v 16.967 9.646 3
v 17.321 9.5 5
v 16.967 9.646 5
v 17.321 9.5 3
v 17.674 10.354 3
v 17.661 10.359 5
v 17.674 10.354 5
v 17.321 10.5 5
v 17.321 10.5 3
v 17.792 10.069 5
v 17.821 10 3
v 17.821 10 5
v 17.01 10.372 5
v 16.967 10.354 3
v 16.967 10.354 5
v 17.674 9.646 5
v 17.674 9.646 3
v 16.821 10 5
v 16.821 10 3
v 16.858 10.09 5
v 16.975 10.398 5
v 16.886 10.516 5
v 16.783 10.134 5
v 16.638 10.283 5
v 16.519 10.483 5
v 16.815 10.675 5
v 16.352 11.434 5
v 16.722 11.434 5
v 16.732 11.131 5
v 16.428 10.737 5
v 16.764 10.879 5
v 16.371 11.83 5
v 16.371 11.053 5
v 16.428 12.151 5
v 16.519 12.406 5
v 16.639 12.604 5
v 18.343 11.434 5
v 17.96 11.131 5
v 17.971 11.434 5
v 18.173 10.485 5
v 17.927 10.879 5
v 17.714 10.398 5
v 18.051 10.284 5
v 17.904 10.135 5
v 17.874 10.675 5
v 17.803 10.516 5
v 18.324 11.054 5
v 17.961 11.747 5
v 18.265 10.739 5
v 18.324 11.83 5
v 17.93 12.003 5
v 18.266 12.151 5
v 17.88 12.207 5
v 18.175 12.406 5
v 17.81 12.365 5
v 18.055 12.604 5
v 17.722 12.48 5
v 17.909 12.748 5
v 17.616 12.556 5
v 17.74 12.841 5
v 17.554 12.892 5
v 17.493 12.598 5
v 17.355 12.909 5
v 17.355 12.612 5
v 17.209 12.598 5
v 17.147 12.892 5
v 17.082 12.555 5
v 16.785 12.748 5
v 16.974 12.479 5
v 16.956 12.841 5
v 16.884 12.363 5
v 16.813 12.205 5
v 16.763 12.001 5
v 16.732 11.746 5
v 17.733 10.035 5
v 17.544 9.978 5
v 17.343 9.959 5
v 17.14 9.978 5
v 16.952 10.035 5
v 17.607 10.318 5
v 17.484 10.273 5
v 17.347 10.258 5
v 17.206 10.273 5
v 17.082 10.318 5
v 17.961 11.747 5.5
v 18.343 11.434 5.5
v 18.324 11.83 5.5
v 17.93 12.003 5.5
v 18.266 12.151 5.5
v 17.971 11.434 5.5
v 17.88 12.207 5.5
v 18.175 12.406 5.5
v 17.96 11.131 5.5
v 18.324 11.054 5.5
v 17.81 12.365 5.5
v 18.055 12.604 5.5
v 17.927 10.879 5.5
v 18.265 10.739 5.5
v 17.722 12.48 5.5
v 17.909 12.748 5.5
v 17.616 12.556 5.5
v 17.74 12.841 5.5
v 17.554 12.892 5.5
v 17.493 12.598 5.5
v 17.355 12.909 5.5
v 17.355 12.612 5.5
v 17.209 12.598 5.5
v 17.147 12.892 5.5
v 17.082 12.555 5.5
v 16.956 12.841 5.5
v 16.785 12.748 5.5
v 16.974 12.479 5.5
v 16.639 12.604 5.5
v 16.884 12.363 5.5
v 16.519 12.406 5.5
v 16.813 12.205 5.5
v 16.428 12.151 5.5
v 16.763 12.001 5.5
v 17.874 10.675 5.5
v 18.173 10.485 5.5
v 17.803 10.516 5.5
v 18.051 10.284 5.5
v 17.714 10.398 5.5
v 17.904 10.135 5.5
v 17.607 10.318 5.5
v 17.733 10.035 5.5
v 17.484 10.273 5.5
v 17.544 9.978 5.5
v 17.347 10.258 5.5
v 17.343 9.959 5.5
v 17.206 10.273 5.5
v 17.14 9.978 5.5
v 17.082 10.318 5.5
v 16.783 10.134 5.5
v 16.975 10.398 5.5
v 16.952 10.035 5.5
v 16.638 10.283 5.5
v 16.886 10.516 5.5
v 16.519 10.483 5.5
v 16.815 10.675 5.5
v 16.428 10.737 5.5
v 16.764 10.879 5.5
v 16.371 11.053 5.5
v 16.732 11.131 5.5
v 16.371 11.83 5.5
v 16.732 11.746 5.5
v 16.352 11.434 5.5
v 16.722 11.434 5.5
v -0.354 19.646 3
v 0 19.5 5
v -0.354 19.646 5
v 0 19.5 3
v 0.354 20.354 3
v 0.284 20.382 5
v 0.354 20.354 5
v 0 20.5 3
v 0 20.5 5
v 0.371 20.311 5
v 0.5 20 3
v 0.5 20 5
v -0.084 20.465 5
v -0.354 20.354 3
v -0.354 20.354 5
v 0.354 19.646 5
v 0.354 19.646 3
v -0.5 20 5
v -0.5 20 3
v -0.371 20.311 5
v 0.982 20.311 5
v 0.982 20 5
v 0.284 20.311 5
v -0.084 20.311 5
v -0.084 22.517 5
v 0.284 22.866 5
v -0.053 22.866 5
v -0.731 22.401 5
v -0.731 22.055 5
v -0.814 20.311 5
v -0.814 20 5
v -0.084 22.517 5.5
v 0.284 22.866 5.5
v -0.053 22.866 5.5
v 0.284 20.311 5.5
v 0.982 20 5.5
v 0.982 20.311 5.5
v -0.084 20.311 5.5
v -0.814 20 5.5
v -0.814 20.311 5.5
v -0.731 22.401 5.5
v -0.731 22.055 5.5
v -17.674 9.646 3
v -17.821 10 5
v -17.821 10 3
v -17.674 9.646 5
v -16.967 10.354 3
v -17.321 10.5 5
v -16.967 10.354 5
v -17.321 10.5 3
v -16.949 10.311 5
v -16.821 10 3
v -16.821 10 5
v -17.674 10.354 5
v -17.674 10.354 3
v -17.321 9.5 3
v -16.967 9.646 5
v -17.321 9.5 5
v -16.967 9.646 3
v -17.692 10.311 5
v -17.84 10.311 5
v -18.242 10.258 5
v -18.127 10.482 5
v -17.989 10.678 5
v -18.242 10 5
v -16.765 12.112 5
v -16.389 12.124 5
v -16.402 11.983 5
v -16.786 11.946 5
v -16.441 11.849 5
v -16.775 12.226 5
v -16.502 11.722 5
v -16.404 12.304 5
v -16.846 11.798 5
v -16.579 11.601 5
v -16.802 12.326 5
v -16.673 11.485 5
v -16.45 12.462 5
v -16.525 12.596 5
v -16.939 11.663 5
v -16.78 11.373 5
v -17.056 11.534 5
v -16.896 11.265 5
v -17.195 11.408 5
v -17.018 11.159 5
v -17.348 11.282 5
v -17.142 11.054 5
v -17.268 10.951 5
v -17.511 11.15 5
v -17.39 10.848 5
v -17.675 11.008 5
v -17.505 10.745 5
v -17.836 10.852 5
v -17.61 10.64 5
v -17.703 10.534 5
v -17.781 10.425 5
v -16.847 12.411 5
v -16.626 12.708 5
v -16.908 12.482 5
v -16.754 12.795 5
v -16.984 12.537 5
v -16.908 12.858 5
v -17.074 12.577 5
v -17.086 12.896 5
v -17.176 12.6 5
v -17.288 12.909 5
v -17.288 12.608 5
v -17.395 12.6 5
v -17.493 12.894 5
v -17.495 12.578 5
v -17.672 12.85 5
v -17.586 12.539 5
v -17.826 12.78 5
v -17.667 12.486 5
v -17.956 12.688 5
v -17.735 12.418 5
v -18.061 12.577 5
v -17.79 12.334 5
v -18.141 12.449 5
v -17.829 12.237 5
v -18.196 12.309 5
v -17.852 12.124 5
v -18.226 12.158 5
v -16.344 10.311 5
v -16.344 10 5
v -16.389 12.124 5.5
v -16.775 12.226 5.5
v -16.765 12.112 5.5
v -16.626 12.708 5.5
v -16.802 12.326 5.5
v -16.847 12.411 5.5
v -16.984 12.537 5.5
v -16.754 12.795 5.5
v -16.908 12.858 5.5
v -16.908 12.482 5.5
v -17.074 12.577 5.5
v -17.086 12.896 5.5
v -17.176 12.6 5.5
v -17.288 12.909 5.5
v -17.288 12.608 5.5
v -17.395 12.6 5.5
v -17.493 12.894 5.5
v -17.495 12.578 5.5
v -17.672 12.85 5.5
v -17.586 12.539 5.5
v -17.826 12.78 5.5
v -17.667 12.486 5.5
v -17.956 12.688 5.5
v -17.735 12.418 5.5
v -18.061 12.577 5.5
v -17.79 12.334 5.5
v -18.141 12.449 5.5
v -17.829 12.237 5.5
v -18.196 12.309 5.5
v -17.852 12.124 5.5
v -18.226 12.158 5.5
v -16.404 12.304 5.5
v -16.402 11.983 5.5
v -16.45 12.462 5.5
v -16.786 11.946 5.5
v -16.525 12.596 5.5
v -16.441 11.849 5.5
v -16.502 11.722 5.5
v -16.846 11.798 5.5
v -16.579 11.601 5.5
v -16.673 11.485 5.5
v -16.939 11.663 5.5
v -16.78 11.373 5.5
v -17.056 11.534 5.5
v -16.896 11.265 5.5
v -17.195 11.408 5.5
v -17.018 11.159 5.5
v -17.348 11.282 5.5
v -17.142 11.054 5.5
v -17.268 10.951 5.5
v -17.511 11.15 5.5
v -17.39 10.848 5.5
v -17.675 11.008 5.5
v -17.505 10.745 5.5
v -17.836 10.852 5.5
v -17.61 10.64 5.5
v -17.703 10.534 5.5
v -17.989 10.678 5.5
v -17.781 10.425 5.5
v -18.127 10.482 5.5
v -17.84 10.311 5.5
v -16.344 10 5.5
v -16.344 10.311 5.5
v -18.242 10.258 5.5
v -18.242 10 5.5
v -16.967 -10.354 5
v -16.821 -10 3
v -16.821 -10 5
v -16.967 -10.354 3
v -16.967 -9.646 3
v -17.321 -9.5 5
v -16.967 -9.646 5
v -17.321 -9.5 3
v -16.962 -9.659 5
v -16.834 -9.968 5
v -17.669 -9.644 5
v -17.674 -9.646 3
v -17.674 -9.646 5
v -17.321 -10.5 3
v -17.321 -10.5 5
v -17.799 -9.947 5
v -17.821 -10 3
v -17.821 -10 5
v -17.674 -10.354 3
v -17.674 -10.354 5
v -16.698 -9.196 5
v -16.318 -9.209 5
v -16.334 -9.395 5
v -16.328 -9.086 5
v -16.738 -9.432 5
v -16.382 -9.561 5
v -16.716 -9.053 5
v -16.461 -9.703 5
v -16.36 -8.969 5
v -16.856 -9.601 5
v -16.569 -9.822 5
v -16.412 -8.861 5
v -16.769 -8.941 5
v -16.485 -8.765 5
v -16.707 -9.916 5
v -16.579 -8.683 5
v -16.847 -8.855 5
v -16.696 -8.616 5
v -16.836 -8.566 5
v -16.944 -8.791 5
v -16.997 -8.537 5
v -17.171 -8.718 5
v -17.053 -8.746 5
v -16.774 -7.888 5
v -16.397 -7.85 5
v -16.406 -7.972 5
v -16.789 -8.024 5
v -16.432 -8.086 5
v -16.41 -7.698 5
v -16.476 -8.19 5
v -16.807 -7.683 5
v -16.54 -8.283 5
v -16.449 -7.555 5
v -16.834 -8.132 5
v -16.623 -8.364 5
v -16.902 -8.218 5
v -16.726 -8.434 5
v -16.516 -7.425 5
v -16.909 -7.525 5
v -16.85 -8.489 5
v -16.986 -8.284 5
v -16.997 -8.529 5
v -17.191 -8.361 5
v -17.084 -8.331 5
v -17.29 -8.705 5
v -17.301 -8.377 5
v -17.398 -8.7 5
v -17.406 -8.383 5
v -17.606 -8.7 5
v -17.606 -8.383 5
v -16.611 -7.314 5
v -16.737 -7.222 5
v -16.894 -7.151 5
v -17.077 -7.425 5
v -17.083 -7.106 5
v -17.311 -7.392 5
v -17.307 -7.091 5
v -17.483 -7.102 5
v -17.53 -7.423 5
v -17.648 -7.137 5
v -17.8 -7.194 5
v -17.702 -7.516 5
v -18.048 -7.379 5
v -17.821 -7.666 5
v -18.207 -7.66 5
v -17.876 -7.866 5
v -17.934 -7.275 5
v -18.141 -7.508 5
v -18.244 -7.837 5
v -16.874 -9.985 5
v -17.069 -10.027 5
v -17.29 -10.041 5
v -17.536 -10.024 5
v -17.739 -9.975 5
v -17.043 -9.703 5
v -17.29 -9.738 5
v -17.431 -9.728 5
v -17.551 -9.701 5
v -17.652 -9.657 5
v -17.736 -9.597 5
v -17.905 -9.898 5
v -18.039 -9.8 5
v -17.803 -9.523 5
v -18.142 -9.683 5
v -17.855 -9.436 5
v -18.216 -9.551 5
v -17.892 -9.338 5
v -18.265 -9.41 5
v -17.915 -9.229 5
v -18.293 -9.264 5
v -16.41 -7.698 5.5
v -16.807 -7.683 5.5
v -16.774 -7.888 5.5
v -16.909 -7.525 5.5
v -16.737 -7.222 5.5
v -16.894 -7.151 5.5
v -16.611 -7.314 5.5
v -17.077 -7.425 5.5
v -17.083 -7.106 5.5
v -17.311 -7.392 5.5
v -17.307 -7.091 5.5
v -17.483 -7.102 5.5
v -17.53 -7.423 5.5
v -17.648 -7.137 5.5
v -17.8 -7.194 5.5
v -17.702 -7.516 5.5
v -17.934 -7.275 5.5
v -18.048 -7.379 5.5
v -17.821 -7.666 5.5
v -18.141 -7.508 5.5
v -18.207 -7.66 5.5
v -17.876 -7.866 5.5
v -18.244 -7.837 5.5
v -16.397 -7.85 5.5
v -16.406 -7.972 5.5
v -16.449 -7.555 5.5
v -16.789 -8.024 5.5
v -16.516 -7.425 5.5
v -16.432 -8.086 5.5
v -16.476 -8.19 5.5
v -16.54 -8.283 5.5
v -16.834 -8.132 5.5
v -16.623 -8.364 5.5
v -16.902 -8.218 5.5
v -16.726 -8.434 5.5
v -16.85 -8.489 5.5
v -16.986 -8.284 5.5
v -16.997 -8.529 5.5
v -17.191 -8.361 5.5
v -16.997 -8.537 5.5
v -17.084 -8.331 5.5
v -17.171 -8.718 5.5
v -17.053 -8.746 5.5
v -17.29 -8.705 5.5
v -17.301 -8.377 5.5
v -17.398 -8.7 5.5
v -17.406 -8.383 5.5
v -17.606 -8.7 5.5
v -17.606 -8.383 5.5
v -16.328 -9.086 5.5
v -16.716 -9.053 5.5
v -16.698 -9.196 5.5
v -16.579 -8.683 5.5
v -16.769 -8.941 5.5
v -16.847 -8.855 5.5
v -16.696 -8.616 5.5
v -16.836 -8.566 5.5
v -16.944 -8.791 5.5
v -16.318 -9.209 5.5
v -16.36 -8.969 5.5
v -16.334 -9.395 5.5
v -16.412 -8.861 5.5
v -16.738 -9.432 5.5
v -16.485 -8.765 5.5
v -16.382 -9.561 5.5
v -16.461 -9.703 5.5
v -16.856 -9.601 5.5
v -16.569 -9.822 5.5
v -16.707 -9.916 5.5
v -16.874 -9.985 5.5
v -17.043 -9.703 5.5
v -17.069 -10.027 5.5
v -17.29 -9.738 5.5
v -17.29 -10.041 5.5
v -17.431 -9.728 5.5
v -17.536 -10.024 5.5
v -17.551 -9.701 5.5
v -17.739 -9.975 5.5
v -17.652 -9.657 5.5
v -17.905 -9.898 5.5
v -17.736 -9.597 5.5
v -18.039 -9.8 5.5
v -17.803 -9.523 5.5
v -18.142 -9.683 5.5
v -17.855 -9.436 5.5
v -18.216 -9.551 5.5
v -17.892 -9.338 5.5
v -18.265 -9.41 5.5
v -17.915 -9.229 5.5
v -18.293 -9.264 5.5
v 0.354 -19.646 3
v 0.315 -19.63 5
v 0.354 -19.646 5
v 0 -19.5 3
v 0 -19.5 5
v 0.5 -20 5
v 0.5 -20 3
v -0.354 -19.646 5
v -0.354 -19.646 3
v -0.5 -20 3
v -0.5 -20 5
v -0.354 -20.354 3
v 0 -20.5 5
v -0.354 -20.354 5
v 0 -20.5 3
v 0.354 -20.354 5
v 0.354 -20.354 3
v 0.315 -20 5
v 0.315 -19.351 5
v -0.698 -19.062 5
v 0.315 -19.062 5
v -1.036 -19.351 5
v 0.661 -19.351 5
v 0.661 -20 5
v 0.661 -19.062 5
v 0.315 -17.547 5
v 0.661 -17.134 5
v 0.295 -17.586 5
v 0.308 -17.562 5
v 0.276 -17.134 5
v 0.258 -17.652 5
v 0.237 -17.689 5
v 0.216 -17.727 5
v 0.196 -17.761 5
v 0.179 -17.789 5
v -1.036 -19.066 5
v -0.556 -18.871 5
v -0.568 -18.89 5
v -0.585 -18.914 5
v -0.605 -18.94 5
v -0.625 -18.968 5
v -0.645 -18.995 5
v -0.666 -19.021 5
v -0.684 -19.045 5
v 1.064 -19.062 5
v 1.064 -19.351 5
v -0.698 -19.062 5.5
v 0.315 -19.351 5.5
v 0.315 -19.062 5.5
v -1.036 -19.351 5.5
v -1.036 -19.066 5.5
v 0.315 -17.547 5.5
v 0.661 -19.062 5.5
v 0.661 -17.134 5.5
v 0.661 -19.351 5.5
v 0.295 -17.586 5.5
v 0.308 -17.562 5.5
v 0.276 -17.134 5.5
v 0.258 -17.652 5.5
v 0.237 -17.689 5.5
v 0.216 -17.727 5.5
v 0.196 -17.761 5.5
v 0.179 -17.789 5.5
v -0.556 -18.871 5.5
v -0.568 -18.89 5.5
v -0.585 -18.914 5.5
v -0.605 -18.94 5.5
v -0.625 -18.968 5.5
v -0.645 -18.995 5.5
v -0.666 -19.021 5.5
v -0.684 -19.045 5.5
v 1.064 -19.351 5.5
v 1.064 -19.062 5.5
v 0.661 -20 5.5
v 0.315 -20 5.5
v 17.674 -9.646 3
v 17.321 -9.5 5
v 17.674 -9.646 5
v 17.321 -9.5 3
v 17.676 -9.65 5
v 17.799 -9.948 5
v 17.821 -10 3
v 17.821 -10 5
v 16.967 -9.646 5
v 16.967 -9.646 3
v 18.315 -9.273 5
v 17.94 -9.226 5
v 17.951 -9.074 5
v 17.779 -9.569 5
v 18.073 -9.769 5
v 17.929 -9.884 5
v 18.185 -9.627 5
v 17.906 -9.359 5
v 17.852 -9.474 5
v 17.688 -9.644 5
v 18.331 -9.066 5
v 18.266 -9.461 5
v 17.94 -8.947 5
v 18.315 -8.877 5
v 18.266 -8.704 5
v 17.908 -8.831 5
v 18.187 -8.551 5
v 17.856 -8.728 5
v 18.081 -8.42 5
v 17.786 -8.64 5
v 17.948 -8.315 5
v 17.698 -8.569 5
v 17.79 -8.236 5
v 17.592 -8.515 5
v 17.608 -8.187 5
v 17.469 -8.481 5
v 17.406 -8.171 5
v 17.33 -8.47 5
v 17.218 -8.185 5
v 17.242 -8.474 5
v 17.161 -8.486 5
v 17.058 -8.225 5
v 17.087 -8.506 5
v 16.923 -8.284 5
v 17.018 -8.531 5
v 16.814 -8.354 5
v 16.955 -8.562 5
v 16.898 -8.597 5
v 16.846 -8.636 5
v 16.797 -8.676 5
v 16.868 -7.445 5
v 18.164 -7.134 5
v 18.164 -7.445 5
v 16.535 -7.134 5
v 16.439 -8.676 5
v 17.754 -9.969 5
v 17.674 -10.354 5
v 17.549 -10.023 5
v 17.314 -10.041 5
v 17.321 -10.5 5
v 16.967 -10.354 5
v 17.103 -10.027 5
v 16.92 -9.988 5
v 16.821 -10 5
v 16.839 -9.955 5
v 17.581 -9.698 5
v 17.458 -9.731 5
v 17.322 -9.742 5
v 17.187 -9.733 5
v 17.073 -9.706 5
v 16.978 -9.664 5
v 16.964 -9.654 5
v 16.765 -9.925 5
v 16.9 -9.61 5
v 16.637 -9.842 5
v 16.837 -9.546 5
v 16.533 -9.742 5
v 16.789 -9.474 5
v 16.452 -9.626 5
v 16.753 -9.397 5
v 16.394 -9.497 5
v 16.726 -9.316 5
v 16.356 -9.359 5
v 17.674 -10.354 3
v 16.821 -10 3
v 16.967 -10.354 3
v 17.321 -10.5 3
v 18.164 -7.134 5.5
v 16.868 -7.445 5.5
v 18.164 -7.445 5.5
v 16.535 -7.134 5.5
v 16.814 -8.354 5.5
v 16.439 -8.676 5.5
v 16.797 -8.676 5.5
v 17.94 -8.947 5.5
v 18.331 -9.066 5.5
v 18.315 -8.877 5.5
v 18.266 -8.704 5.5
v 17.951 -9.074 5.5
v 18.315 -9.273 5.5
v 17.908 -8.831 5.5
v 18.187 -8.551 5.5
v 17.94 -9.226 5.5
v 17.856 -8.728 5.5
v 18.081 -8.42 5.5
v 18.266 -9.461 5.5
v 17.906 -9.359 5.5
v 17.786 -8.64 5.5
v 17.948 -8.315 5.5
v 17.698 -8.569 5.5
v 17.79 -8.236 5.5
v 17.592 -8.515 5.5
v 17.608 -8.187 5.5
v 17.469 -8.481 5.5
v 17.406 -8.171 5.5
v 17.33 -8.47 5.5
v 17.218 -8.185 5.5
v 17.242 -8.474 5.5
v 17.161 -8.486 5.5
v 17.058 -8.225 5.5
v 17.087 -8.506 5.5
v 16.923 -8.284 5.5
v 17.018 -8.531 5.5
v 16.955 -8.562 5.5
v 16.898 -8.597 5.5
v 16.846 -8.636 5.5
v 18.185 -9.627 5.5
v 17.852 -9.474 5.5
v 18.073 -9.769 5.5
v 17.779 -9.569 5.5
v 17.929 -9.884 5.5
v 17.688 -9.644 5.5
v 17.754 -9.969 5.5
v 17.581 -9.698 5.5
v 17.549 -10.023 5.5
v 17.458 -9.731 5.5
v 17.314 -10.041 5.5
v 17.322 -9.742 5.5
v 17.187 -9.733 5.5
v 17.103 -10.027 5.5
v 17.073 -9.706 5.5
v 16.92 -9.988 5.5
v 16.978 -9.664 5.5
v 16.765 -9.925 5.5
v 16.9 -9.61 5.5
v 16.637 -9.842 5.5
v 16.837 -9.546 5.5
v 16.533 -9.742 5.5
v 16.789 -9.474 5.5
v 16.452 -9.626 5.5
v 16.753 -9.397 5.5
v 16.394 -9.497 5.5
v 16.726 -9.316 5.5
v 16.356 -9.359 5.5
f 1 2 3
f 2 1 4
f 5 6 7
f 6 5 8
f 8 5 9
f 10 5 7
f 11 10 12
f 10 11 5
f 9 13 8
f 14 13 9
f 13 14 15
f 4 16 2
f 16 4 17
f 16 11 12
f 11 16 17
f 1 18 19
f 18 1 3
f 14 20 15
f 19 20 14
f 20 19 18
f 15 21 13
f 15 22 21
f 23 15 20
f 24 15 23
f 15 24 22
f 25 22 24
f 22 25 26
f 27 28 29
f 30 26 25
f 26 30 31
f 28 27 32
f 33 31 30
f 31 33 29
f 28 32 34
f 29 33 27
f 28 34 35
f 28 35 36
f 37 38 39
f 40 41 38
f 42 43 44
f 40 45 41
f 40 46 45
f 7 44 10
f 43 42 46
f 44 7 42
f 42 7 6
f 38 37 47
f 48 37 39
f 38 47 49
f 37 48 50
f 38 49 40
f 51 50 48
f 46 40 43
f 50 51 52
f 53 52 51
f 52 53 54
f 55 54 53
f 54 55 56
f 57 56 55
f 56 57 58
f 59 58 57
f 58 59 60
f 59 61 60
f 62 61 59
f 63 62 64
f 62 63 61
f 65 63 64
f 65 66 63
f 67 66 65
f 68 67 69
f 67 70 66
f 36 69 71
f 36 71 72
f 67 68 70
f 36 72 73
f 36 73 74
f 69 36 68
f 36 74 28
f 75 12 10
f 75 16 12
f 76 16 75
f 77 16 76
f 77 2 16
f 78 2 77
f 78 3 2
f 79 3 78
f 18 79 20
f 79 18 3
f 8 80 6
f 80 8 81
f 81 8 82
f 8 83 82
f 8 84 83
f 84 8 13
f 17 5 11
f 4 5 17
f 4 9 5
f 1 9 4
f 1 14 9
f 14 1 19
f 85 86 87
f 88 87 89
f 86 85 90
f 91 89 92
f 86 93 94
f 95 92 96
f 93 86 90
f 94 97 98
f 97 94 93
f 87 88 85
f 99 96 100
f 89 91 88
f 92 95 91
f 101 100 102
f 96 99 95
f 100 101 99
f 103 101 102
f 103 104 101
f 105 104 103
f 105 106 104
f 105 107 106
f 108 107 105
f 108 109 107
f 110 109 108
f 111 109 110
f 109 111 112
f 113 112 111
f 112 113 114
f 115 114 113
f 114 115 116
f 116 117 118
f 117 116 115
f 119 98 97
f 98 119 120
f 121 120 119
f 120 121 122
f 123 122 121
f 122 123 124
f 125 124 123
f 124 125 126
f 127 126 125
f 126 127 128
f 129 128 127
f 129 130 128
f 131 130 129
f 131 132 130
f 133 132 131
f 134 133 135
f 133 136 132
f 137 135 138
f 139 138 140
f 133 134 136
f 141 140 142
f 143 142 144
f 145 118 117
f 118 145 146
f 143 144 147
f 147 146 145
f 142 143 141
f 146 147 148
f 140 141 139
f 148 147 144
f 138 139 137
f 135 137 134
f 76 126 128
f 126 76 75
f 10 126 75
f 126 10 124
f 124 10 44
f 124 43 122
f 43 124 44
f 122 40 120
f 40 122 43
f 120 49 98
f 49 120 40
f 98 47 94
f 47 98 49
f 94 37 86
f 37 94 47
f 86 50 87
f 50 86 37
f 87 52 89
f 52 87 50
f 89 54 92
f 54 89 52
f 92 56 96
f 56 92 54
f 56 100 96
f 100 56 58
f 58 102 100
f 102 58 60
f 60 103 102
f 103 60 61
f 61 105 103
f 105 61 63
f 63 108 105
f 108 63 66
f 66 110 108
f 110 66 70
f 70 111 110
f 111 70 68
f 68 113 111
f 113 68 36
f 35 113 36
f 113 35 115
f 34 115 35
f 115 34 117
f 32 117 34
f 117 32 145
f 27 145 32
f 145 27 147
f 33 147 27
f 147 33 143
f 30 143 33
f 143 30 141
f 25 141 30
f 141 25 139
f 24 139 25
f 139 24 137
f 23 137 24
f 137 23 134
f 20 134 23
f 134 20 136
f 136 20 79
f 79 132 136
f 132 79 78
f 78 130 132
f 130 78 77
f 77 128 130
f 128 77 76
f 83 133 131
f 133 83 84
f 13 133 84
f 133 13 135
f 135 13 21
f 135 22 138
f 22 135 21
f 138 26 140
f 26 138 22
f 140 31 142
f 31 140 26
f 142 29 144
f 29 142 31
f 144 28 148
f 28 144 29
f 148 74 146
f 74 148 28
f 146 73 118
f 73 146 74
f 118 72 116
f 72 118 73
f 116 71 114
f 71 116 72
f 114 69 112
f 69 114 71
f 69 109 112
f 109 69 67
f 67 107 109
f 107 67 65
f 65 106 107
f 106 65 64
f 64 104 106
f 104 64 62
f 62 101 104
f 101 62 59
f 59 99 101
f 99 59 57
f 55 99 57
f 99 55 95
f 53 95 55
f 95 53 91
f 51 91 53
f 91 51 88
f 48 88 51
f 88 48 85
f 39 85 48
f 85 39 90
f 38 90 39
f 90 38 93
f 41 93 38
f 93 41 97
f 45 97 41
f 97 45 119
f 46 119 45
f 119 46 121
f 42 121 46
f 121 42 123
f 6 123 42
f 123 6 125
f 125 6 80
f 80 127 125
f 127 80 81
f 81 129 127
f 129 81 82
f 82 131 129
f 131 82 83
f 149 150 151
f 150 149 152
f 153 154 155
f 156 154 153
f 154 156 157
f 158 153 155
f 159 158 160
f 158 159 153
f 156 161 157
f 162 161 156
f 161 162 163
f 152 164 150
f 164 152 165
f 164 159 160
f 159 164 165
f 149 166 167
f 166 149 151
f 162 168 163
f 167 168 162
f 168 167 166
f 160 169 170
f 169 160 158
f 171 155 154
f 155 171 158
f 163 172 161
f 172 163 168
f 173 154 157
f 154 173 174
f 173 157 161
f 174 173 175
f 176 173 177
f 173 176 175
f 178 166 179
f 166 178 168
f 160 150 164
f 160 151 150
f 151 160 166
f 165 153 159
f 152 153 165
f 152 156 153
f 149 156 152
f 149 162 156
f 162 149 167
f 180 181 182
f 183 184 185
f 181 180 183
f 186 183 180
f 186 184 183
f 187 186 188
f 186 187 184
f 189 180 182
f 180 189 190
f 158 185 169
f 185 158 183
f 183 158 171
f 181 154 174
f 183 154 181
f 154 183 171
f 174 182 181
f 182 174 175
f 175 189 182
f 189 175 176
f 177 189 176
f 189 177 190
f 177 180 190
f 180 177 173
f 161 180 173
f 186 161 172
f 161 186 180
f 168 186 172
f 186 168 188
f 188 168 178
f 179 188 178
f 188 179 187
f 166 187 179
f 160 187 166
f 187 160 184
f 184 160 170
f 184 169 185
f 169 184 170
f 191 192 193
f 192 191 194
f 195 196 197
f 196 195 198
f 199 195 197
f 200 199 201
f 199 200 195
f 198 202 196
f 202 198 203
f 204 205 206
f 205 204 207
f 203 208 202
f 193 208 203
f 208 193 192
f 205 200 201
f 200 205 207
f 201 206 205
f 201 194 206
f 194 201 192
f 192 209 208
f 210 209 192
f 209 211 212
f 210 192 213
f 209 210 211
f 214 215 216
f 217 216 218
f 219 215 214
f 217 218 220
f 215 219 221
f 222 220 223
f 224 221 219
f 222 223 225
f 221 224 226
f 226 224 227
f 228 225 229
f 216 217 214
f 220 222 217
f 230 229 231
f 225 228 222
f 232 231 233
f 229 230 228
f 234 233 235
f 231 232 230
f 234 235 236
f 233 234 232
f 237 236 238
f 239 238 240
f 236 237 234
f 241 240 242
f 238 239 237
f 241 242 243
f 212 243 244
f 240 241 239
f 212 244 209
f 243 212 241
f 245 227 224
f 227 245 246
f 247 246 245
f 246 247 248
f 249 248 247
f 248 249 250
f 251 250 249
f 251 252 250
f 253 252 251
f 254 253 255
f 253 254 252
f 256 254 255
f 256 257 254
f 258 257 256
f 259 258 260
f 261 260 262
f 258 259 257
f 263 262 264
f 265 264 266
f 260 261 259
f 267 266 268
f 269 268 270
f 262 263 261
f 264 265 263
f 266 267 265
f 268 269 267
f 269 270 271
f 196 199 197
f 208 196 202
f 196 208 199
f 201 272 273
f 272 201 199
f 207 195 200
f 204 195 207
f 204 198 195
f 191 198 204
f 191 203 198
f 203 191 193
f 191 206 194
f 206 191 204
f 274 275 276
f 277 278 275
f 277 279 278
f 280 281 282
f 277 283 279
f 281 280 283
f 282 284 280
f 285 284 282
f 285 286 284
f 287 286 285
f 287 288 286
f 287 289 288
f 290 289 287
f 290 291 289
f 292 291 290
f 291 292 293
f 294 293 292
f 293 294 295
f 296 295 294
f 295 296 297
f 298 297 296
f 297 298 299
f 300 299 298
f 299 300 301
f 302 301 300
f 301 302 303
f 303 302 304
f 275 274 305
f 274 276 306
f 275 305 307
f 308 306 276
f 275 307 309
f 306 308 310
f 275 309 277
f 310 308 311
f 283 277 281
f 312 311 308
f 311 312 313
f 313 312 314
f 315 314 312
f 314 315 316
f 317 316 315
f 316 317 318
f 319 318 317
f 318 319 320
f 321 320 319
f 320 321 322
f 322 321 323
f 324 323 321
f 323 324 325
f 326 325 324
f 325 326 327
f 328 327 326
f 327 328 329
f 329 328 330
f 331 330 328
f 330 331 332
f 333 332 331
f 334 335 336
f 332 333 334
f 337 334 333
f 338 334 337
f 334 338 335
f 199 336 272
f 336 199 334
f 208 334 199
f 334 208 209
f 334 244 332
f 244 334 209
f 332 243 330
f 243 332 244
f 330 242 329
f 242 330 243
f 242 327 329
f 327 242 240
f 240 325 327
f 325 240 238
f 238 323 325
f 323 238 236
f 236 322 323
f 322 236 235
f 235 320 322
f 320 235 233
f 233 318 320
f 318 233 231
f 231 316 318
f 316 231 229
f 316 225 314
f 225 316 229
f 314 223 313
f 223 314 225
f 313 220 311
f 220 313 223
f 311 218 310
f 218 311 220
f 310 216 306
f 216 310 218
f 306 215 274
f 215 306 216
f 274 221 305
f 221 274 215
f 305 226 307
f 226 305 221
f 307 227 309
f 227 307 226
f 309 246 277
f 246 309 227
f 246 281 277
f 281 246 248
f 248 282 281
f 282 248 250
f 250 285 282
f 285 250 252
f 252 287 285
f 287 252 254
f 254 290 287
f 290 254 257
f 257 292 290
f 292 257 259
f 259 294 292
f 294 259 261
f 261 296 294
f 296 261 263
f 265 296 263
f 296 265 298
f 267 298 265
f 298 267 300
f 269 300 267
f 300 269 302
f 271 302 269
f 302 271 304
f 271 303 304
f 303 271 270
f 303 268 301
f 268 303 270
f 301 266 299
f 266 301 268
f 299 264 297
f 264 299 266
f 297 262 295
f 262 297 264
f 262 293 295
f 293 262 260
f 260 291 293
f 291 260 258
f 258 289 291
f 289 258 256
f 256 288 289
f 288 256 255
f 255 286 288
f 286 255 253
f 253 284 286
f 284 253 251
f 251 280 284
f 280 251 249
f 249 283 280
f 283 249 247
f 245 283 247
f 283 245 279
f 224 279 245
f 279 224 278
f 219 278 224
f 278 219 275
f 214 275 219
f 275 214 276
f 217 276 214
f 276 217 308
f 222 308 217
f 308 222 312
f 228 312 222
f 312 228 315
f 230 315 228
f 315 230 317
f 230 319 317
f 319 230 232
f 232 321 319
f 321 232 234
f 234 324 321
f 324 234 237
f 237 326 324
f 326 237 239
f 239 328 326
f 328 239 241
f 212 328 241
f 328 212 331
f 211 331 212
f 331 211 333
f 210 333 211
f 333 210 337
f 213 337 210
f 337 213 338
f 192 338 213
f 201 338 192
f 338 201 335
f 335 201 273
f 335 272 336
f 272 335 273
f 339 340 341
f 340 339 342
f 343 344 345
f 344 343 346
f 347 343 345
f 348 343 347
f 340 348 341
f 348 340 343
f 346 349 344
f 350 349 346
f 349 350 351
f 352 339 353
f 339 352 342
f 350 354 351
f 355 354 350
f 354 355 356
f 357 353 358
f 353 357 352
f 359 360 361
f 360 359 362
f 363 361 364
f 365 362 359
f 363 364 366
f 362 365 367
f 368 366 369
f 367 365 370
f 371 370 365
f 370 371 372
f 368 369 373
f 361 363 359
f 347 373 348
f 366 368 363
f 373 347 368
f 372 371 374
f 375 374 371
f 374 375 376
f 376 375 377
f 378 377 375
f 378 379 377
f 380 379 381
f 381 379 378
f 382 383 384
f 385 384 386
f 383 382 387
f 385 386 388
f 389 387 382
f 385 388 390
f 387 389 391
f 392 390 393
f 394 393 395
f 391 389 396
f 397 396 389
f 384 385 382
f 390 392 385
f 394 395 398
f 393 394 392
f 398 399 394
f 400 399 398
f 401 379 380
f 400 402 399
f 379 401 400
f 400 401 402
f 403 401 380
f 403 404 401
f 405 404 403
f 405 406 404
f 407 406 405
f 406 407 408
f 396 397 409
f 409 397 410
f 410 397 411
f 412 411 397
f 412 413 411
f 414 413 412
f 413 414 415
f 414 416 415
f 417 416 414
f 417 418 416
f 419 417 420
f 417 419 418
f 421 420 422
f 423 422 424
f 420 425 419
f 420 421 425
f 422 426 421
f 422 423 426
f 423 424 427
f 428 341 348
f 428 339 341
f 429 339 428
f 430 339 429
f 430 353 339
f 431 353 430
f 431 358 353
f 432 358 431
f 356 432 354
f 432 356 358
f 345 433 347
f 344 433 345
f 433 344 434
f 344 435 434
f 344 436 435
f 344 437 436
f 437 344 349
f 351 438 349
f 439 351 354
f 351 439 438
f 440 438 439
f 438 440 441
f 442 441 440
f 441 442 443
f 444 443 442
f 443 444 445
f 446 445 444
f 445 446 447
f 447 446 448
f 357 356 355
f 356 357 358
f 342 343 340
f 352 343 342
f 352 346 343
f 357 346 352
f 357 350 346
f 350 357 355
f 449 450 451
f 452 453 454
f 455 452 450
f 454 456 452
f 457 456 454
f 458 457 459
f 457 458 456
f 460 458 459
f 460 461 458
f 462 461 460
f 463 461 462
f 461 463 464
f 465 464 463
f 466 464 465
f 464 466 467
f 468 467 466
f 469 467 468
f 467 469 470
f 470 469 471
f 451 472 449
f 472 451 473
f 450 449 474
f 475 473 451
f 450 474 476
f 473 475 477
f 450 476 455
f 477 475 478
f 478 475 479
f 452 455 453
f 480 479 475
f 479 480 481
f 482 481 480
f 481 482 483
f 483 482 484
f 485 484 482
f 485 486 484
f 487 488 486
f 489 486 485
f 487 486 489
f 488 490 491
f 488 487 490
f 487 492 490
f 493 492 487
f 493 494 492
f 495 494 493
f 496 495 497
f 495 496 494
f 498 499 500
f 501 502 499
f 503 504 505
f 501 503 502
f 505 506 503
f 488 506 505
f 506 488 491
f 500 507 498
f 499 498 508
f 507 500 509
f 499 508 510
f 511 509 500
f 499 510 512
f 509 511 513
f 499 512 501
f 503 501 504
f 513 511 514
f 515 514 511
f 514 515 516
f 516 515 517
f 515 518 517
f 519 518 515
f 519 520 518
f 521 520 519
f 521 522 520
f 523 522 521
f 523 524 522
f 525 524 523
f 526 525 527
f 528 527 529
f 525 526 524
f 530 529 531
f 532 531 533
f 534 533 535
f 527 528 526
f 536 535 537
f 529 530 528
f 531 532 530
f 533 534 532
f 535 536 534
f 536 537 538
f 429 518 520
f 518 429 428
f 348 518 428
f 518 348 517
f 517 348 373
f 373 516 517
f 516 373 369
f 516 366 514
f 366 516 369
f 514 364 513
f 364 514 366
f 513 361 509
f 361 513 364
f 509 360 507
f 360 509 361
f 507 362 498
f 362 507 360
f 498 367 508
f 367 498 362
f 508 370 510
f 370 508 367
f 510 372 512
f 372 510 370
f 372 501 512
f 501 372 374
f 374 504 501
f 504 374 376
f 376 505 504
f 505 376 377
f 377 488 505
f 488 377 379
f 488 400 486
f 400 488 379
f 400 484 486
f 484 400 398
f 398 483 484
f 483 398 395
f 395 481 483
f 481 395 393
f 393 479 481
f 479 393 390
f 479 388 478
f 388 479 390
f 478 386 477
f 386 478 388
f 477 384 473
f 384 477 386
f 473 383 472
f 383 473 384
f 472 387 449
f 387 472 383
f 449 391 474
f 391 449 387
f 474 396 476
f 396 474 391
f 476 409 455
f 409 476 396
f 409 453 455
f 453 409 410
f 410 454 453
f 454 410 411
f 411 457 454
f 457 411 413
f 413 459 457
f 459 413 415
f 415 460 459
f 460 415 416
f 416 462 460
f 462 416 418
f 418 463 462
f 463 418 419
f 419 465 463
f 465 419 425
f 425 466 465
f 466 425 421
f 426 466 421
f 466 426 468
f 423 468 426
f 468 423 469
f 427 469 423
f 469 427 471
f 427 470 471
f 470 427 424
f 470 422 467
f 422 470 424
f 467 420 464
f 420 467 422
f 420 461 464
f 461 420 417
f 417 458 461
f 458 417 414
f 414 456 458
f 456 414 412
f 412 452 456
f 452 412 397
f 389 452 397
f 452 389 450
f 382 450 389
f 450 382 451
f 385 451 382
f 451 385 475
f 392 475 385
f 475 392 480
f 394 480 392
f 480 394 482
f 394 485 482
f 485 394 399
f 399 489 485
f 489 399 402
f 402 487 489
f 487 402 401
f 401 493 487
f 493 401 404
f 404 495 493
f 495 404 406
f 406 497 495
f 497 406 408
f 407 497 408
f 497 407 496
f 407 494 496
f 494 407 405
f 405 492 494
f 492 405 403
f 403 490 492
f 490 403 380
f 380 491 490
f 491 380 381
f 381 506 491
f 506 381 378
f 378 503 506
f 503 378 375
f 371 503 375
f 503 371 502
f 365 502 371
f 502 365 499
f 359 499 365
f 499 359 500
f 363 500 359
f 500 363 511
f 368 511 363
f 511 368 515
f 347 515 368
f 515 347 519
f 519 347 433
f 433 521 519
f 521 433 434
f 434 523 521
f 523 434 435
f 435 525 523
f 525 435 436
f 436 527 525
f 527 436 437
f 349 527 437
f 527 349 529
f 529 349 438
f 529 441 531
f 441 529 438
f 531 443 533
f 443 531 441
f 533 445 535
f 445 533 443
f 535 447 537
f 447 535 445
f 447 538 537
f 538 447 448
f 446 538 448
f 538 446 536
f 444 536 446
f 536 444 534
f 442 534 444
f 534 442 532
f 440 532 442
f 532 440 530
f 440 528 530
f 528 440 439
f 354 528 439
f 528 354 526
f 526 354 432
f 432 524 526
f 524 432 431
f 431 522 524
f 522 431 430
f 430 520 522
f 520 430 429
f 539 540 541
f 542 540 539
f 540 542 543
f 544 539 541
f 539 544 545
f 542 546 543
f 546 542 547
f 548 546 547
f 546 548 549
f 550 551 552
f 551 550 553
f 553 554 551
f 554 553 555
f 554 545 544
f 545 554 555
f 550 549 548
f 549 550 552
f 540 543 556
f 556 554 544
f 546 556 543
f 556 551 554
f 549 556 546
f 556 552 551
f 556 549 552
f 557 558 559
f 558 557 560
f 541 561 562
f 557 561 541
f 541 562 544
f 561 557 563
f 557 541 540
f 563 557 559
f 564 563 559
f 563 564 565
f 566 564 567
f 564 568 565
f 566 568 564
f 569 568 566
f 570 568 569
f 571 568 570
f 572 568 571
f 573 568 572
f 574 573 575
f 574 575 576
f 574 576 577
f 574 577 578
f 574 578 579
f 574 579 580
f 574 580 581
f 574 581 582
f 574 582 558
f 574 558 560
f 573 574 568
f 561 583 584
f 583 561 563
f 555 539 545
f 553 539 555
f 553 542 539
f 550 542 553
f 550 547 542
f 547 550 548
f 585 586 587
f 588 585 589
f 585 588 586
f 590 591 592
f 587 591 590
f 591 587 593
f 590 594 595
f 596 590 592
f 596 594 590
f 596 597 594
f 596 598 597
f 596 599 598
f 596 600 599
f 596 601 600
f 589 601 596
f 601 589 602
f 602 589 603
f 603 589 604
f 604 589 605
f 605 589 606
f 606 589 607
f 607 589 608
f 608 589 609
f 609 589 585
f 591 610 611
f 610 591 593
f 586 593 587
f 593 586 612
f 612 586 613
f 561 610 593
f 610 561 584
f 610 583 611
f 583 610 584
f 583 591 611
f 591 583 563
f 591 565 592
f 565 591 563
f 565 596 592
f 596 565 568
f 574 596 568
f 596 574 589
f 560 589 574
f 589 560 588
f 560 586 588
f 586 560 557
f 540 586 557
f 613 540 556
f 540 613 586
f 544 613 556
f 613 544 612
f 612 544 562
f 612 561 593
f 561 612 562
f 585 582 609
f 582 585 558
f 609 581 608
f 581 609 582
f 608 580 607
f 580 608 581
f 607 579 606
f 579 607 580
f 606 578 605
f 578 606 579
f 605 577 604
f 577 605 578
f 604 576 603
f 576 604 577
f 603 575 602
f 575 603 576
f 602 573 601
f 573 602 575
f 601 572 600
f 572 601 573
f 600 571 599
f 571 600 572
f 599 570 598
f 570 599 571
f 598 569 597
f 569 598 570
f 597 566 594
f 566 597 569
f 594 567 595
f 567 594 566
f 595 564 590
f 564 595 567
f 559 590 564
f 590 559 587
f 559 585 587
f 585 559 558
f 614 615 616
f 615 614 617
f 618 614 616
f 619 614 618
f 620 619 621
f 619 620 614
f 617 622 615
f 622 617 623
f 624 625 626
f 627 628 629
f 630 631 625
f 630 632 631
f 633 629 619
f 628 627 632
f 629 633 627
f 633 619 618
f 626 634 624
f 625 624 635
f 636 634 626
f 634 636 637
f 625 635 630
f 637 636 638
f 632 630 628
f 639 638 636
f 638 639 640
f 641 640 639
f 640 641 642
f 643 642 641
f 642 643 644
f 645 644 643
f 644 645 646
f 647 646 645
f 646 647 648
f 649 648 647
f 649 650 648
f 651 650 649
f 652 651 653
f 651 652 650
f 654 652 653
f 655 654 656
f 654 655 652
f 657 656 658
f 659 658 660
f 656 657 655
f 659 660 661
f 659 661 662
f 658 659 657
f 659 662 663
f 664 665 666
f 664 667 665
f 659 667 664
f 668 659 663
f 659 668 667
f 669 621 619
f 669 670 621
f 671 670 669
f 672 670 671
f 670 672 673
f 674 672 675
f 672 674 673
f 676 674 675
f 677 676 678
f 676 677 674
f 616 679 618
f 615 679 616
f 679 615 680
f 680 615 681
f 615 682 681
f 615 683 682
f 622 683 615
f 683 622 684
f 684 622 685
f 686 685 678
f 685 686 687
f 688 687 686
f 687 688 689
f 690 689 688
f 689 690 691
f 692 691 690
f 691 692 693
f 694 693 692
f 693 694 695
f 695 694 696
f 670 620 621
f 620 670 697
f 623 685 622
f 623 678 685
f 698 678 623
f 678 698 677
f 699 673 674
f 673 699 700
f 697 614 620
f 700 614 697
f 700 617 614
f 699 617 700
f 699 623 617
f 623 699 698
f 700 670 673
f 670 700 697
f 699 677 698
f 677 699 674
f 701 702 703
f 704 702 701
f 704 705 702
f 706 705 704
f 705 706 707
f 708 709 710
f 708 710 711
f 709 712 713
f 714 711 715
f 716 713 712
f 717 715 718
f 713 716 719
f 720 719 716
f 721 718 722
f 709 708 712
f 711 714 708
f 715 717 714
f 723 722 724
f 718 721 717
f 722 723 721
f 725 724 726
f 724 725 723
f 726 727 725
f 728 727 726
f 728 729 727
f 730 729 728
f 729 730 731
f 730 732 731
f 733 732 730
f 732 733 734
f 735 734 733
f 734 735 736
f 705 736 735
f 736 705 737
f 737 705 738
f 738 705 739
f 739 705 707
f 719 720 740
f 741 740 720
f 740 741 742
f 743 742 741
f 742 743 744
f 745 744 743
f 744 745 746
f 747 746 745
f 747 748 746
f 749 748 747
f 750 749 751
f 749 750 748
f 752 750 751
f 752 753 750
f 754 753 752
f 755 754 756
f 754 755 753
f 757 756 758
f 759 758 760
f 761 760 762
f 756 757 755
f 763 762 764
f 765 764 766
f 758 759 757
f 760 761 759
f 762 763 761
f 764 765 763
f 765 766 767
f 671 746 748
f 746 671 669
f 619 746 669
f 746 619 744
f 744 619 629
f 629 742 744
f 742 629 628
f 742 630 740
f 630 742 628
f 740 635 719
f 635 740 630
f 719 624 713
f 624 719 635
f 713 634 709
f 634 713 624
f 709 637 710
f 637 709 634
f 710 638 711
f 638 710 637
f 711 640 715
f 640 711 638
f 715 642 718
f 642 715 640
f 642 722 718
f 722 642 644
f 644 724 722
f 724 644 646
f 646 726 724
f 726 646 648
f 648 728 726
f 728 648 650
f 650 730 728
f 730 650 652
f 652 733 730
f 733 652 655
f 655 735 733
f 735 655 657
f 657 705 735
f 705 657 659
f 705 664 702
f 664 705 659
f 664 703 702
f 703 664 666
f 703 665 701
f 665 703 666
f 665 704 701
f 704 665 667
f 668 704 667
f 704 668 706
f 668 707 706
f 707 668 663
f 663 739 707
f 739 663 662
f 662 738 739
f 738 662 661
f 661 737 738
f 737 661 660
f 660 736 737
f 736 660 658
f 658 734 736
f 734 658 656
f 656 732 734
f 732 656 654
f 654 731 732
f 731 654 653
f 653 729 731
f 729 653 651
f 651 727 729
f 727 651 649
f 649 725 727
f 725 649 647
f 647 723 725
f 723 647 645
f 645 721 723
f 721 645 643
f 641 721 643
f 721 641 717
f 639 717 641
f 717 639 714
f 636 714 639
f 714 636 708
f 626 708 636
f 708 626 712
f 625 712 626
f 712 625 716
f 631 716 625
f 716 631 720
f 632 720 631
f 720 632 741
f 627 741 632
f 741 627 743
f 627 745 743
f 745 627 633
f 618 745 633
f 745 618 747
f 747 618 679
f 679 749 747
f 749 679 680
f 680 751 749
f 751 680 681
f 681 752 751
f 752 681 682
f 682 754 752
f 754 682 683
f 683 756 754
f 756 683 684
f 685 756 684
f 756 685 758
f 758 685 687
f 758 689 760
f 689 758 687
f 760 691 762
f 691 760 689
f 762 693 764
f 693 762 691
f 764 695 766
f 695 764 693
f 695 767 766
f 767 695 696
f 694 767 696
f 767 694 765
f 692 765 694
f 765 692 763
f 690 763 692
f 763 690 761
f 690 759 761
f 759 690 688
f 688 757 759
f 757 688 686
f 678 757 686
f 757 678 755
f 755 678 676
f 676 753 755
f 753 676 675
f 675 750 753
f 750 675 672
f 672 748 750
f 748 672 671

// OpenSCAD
// Parametric Interlocking Hexagonal Tile System
// Features placed at fixed distance from vertex on opposite edges

/* [Tile Dimensions] */
edge_len = 20;        // Edge length of hexagon
thickness = 3;        // Tile thickness (z-height)

/* [Feature Parameters] */
feat_dist = 10;       // Distance C from vertex to feature center
feat_size = 4;        // Feature size
feat_depth = 2;       // Feature protrusion depth

/* [Feature Enable Pairs] */
pair_0_3 = true;      // Edges 0 & 3 (right & left)
pair_1_4 = true;      // Edges 1 & 4 (top-right & bottom-left)
pair_2_5 = false;     // Edges 2 & 5 (top-left & bottom-right)

/* [Preview Options] */
show_grid = true;
show_measurements = true;  // Show debug measurement markers

// ============================================================
// FEATURE SHAPE
// ============================================================

// Generic feature shape A - centered at origin
// Feature is oriented to protrude in +X direction
module feature_shape() {
  polygon([
    [0, -feat_size/2],           // Left bottom (on hex edge)
    [0, feat_size/2],            // Left top (on hex edge)
    [feat_depth, feat_size/3],   // Right top (angled)
    [feat_depth, -feat_size/3]   // Right bottom (angled)
  ]);
}

// ============================================================
// DEBUG HELPERS
// ============================================================

// Show vertex positions and edge measurements
module show_debug_markers() {
  for (i=[0:5]) {
    ang = 30 + i * 60;
    v = [edge_len * cos(ang), edge_len * sin(ang)];
    echo(str("Vertex ", i, ": "), v);
    color("red") translate([v[0], v[1], thickness])
      cylinder(h=2, r=0.5, $fn=8);
    color("blue") translate([v[0], v[1], thickness+2])
      linear_extrude(0.5) text(str(i), size=3, halign="center");
  }
  echo("Flat-to-flat should be:", edge_len * sqrt(3));
}

// ============================================================
// CORE GEOMETRY
// ============================================================

module base_hex(e) {
  r = e;
  polygon([for(i=[0:5]) [r*cos(30+i*60), r*sin(30+i*60)]]);
}

// Place feature at distance from starting vertex of edge
module place_feature_on_edge(e, idx, dist, add) {
  // Vertices of flat-top hexagon
  v0_ang = 30 + idx * 60;
  v1_ang = 30 + (idx + 1) * 60;
  
  v0 = [e * cos(v0_ang), e * sin(v0_ang)];  // Starting vertex
  v1 = [e * cos(v1_ang), e * sin(v1_ang)];  // Ending vertex
  
  // Direction along edge
  edge_dir = v1 - v0;
  edge_len_actual = sqrt(edge_dir[0]*edge_dir[0] + edge_dir[1]*edge_dir[1]);
  edge_unit = edge_dir / edge_len_actual;
  
  // Position at distance from v0
  feat_pos = v0 + edge_unit * dist;
  
  // Angle perpendicular to edge (pointing outward)
  edge_ang = atan2(edge_dir[1], edge_dir[0]);
  perp_ang = edge_ang - 90;  // Changed from +90 to -90
  
  translate(feat_pos)
    rotate(perp_ang)
      if (add) {
        # translate([0, 0]) feature_shape();
      } else {
        # translate([0, 0]) mirror([1, 0]) feature_shape();
      }
}

// 2D tile with complementary features
module tile2d() {
  pairs = [
    [0, 3, pair_0_3],
    [1, 4, pair_1_4],
    [2, 5, pair_2_5]
  ];
  
  difference() {
    union() {
      base_hex(edge_len);
      // Add protruding features - measure from starting vertex
      for (p = pairs) {
        if (p[2]) {
          place_feature_on_edge(edge_len, p[0], feat_dist, true);
        }
      }
    }
    // Subtract recessed features - measure from opposite end
    for (p = pairs) {
      if (p[2]) {
        // Calculate edge length and measure from opposite end
        v0_ang = 30 + p[1] * 60;
        v1_ang = 30 + (p[1] + 1) * 60;
        v0 = [edge_len * cos(v0_ang), edge_len * sin(v0_ang)];
        v1 = [edge_len * cos(v1_ang), edge_len * sin(v1_ang)];
        edge_dir = v1 - v0;
        edge_length = sqrt(edge_dir[0]*edge_dir[0] + edge_dir[1]*edge_dir[1]);
        
        place_feature_on_edge(edge_len, p[1], edge_length - feat_dist, false);
      }
    }
  }
}

module tile3d() {
  linear_extrude(thickness) tile2d();
}

// ============================================================
// GRID (pointy-top) — with random colors
// ============================================================

// Convert axial hex coords (q,r) -> 2D center
function axial_to_xy(q, r, s) = [ s*sqrt(3)*(q + r/2), 1.5*s*r ];

// Generate a reproducible random color for each (q,r)
function random_color(q, r) = 
    let(seed = q*100 + r*17)           // unique per tile
    [ for (c = rands(0, 1, 3, seed)) c ];  // 3 floats [0–1]

// Place one tile at axial (q,r)
module tile_at_axial(q, r) {
  xy = axial_to_xy(q, r, edge_len);
  col = random_color(q, r);
  color(col)
    translate([xy[0], xy[1], 0]) tile3d();
}

// Preview: rectangular block in axial coords
// Preview grid
COLS = 2;
ROWS = 2;

module show_tile_grid_pointy() {
  for (r = [0:ROWS-1])
    for (q = [0:COLS-1])
      tile_at_axial(q, r);
}

// ============================================================
// RENDER
// ============================================================

if (show_grid) {
  show_tile_grid_pointy();
  if (show_measurements) {
    translate([0, 0, 0]) show_debug_markers();
  }
} else {
  tile3d();
  if (show_measurements) {
    show_debug_markers();
  }
}
